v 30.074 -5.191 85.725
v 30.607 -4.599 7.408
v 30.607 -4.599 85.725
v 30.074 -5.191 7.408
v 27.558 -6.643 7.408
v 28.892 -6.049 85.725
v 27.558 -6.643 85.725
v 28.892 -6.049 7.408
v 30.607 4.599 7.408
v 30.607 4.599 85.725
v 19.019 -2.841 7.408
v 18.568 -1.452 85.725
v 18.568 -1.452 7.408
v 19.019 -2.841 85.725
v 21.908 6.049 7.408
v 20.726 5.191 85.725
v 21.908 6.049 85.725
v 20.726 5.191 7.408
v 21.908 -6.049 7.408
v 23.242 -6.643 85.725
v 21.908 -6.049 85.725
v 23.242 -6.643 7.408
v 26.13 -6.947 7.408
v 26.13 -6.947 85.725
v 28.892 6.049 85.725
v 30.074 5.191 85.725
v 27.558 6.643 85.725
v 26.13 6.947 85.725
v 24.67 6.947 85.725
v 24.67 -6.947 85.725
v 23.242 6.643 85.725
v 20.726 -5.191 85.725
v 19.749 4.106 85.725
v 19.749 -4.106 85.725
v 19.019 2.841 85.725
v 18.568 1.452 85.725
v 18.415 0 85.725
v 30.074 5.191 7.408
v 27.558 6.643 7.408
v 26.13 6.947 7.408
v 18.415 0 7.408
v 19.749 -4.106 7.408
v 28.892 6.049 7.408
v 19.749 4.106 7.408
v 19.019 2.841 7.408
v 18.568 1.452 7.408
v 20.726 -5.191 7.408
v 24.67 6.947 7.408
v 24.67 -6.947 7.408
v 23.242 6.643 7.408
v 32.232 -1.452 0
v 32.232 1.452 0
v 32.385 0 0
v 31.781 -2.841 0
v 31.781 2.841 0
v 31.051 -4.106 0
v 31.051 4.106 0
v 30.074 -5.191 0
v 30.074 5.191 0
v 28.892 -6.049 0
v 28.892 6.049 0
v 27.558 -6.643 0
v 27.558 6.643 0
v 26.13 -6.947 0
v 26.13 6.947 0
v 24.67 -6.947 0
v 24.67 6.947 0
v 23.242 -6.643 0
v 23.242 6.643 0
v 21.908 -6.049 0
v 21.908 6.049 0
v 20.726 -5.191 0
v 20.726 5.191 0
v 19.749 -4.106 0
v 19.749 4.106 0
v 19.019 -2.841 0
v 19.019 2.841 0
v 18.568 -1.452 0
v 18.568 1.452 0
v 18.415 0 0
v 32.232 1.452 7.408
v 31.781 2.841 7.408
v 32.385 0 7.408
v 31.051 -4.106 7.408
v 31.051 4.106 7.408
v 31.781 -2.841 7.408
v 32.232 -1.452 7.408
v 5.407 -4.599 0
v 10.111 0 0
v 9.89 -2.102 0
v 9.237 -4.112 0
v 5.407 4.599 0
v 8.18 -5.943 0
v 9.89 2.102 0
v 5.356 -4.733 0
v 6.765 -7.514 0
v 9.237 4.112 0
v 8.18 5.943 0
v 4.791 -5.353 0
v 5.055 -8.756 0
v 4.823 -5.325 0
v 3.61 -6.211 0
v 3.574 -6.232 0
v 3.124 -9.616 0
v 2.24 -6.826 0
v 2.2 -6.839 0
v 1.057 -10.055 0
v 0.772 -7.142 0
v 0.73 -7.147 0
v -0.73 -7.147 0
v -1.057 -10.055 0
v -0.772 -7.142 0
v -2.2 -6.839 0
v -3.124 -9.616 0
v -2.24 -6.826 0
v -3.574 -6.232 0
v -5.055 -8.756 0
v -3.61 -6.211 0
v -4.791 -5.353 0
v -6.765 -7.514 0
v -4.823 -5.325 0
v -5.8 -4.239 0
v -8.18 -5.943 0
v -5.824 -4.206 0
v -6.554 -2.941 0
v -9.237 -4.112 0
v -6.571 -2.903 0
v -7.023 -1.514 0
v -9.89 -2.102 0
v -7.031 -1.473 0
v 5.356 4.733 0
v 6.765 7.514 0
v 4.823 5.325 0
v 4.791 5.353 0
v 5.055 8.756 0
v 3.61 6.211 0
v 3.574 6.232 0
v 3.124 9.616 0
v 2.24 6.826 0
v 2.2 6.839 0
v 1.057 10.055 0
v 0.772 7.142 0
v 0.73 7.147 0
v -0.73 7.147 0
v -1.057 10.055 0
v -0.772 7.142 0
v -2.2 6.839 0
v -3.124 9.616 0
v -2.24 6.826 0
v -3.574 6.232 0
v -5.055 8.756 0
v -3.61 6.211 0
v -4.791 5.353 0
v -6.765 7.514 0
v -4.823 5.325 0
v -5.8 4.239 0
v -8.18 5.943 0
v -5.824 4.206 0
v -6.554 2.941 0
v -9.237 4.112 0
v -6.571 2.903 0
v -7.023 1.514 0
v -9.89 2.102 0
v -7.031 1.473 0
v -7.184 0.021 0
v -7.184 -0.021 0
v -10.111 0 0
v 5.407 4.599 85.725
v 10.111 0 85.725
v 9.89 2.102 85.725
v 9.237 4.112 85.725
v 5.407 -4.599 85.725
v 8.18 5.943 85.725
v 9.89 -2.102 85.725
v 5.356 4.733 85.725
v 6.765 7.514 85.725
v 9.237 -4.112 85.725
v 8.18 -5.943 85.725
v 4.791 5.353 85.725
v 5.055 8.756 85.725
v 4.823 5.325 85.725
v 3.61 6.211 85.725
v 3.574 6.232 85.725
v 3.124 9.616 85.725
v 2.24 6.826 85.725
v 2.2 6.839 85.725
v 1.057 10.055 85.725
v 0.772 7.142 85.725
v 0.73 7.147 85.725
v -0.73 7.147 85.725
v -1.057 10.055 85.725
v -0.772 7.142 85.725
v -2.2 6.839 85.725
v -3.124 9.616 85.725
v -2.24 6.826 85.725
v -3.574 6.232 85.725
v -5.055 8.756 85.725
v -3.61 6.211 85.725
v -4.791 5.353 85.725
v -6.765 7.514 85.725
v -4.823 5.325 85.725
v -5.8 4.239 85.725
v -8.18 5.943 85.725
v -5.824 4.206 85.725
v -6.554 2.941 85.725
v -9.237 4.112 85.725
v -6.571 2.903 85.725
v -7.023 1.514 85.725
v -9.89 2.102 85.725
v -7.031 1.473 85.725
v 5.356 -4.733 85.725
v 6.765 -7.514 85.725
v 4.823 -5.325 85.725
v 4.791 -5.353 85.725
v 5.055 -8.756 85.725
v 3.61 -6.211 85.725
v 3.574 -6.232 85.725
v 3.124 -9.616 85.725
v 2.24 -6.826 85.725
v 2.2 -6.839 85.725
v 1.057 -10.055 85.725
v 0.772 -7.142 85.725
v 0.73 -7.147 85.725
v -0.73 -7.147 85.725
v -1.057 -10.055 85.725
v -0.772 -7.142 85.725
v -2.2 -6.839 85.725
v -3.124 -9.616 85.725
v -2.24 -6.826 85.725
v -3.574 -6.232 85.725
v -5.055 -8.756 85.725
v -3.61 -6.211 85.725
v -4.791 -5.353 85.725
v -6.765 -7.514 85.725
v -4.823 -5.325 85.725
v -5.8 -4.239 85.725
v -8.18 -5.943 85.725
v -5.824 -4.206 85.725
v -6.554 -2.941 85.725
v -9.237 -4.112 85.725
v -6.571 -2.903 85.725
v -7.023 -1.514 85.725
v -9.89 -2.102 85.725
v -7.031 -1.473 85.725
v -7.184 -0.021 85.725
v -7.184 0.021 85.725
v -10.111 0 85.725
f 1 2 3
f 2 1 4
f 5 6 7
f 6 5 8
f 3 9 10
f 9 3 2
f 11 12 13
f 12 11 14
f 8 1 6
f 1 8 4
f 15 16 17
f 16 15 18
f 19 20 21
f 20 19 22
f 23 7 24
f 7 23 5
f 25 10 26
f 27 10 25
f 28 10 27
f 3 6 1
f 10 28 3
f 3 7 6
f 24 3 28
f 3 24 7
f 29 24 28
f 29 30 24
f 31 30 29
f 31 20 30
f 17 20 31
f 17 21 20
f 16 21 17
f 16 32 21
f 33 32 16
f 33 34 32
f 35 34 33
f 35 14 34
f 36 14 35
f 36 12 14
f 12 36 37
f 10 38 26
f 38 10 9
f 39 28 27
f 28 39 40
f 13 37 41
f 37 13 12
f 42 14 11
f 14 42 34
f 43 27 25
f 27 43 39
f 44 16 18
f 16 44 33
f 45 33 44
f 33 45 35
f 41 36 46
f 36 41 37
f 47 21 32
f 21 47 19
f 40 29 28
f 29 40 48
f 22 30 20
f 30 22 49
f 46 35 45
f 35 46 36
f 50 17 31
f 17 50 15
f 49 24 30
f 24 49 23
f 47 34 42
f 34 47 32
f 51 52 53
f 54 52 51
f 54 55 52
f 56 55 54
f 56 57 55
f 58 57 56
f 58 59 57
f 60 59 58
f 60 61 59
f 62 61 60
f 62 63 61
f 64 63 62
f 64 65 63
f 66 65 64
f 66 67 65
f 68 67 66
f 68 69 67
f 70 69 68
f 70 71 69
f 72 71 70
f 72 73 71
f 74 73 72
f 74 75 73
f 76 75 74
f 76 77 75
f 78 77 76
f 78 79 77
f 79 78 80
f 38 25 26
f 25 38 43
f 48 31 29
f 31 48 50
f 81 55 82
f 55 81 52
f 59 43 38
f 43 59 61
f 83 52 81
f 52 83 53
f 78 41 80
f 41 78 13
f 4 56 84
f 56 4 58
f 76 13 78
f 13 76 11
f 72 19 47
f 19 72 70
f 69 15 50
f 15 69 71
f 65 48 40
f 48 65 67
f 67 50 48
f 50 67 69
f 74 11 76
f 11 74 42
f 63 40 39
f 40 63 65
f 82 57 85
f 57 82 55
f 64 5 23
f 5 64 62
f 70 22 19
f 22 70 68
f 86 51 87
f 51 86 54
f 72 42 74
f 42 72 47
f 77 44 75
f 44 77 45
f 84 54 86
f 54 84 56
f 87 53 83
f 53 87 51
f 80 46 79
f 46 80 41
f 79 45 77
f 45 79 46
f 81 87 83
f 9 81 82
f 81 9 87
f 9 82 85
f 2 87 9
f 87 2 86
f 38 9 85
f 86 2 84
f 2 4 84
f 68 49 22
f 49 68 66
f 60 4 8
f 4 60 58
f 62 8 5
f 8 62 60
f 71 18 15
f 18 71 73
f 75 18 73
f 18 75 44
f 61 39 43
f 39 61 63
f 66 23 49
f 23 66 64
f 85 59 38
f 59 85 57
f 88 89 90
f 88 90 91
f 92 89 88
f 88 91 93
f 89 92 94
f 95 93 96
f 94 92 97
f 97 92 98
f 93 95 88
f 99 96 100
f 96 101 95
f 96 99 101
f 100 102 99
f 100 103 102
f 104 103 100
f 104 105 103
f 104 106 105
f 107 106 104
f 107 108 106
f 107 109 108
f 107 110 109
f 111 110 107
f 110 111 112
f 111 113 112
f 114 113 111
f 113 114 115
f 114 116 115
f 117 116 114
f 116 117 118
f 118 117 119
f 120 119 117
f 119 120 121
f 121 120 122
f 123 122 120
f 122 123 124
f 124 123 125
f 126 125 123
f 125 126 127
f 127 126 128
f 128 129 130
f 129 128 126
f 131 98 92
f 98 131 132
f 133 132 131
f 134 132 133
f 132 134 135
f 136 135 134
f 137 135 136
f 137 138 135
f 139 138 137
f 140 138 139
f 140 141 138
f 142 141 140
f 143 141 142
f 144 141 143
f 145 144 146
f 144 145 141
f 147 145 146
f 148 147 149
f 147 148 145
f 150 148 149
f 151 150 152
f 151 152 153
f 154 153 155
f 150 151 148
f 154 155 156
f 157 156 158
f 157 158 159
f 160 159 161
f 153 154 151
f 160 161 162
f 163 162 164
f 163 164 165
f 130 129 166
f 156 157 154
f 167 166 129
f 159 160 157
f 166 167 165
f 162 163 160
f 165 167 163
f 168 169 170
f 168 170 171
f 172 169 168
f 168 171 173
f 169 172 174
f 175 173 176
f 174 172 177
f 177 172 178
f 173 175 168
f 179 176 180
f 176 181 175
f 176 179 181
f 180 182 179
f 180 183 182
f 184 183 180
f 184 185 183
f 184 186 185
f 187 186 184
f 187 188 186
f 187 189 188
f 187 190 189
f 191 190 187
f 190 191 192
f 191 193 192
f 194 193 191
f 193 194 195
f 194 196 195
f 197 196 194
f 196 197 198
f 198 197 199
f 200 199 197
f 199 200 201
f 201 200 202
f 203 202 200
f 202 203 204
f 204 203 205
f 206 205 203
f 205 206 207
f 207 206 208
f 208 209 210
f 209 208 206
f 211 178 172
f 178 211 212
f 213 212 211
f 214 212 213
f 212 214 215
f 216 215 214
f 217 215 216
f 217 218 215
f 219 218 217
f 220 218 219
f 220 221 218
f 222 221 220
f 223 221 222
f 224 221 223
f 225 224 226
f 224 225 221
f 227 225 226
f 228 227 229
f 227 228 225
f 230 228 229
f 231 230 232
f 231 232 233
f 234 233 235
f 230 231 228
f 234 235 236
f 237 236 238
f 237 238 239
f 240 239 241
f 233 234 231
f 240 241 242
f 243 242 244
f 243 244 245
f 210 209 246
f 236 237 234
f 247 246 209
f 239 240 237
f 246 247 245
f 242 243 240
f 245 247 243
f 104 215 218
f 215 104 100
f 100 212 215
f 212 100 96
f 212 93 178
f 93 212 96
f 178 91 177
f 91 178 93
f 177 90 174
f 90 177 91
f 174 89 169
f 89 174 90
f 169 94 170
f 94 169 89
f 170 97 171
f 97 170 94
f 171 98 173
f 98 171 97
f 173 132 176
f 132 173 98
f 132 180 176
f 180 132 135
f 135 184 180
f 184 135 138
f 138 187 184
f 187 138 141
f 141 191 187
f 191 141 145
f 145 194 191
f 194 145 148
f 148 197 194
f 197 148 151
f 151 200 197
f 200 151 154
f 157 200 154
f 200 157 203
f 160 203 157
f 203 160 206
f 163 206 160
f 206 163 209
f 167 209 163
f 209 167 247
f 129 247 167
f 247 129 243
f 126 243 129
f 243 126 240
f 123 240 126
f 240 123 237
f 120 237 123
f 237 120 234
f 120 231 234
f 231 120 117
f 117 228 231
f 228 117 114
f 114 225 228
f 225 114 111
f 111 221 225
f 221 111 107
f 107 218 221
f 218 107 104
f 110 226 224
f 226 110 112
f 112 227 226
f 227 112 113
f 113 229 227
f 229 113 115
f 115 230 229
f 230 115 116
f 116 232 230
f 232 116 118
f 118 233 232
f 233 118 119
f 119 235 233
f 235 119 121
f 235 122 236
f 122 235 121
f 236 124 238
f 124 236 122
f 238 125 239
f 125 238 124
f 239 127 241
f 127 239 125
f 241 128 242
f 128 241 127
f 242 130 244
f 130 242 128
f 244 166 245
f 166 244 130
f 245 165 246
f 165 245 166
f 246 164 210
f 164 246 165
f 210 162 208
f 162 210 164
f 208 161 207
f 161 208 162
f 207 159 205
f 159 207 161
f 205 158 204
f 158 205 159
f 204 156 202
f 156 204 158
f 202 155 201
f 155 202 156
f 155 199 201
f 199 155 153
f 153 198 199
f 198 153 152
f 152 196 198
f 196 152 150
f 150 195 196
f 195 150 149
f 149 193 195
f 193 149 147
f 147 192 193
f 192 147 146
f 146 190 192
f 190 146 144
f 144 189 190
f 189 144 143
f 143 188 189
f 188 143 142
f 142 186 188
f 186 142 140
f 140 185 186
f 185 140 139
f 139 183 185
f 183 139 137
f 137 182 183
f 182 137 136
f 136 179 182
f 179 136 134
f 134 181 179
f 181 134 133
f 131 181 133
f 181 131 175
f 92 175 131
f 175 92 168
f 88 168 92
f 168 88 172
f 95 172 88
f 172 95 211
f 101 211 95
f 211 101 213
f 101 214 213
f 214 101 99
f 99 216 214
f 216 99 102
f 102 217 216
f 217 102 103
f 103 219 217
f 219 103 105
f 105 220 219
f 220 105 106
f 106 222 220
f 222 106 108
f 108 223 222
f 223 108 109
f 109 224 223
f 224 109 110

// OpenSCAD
// Drill press crank extension
// Adrian McCarthy 2023-09-17

// The nice table my brother made for my 10" Craftsman Drill Press
// blocks the crank used to raise and lower the table.  This is a shaft
// extension to move the crank out.  Printed parts have limited strength
// and the size creates quite a bit of leverage.  So I'll be printing
// these in PETG with extra perimeters and more infill.  The pieces nest
// which reinforces both of them.  Finally, I've sized the coupler to
// just fit inside a sleeve of 3/4" schedule 40 PVC pipe, figuring I
// could expoxy the coupler inside some pipe for additional rigidity.

function inch(inches) = inches * 25.4;

module crank_extension(nozzle_d=0.4) {
    $fs = nozzle_d/2;

    shaft_d = inch(0.550);
    shaft_flat_offset = shaft_d - inch(0.480);
    shaft_l = inch(7/8);  // length of existing shaft
    crank_offset = inch(2.5);  // final may be inch(6.5)

    pvc_inner_d = inch(0.804);  //  average for 3/4" schedule 40 PVC pipe

    // The existing shaft has a flattened side for a set screw.
    // We'll use that as a key.
    module shaft_profile() {
        intersection() {
            circle(d=shaft_d);
            translate([-shaft_flat_offset, 0])
                square(shaft_d, center=true);
        }
    }

    module coupler() {
        linear_extrude(shaft_l + crank_offset) {
            difference() {
                circle(d=pvc_inner_d-nozzle_d/2);
                offset(r=nozzle_d/2) shaft_profile();
            }
        }
    }

    module shaft_extension() {
        linear_extrude(crank_offset + shaft_l) {
            shaft_profile();
        }
        // The crank connection is a cylindrical hole about the same
        // length as the original shaft.  The set screw is halfway
        // down that length, so the key shape need not extend the
        // entire length of the extension.  We'll give it a round
        // base for better bed adhesion.
        linear_extrude(shaft_l/3) circle(d=shaft_d);
    }

    coupler();
    translate([inch(1), 0]) shaft_extension();
}

crank_extension();
